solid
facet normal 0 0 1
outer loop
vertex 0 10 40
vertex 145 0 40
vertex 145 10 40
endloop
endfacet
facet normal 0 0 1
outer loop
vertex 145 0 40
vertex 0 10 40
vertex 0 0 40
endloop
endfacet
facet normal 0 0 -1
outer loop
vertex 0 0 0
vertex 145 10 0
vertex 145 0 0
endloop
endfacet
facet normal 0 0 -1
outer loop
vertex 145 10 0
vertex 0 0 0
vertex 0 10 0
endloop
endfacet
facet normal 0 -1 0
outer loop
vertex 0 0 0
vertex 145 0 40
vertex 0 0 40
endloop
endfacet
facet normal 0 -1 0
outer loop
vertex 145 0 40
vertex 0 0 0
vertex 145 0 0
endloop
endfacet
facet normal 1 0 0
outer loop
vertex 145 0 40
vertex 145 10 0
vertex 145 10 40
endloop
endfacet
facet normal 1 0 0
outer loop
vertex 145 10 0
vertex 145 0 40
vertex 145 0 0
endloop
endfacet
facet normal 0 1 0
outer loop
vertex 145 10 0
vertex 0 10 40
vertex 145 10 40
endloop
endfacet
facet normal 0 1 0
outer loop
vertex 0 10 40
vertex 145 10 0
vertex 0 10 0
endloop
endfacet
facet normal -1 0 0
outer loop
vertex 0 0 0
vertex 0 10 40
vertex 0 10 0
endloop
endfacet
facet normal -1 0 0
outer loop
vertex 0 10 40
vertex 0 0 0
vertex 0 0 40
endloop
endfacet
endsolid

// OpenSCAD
FIRE_WIDTH = 145;
FIRE_DEPTH = 10;
FIRE_HEIGHT = 40;

cube([FIRE_WIDTH, FIRE_DEPTH, FIRE_HEIGHT]);
